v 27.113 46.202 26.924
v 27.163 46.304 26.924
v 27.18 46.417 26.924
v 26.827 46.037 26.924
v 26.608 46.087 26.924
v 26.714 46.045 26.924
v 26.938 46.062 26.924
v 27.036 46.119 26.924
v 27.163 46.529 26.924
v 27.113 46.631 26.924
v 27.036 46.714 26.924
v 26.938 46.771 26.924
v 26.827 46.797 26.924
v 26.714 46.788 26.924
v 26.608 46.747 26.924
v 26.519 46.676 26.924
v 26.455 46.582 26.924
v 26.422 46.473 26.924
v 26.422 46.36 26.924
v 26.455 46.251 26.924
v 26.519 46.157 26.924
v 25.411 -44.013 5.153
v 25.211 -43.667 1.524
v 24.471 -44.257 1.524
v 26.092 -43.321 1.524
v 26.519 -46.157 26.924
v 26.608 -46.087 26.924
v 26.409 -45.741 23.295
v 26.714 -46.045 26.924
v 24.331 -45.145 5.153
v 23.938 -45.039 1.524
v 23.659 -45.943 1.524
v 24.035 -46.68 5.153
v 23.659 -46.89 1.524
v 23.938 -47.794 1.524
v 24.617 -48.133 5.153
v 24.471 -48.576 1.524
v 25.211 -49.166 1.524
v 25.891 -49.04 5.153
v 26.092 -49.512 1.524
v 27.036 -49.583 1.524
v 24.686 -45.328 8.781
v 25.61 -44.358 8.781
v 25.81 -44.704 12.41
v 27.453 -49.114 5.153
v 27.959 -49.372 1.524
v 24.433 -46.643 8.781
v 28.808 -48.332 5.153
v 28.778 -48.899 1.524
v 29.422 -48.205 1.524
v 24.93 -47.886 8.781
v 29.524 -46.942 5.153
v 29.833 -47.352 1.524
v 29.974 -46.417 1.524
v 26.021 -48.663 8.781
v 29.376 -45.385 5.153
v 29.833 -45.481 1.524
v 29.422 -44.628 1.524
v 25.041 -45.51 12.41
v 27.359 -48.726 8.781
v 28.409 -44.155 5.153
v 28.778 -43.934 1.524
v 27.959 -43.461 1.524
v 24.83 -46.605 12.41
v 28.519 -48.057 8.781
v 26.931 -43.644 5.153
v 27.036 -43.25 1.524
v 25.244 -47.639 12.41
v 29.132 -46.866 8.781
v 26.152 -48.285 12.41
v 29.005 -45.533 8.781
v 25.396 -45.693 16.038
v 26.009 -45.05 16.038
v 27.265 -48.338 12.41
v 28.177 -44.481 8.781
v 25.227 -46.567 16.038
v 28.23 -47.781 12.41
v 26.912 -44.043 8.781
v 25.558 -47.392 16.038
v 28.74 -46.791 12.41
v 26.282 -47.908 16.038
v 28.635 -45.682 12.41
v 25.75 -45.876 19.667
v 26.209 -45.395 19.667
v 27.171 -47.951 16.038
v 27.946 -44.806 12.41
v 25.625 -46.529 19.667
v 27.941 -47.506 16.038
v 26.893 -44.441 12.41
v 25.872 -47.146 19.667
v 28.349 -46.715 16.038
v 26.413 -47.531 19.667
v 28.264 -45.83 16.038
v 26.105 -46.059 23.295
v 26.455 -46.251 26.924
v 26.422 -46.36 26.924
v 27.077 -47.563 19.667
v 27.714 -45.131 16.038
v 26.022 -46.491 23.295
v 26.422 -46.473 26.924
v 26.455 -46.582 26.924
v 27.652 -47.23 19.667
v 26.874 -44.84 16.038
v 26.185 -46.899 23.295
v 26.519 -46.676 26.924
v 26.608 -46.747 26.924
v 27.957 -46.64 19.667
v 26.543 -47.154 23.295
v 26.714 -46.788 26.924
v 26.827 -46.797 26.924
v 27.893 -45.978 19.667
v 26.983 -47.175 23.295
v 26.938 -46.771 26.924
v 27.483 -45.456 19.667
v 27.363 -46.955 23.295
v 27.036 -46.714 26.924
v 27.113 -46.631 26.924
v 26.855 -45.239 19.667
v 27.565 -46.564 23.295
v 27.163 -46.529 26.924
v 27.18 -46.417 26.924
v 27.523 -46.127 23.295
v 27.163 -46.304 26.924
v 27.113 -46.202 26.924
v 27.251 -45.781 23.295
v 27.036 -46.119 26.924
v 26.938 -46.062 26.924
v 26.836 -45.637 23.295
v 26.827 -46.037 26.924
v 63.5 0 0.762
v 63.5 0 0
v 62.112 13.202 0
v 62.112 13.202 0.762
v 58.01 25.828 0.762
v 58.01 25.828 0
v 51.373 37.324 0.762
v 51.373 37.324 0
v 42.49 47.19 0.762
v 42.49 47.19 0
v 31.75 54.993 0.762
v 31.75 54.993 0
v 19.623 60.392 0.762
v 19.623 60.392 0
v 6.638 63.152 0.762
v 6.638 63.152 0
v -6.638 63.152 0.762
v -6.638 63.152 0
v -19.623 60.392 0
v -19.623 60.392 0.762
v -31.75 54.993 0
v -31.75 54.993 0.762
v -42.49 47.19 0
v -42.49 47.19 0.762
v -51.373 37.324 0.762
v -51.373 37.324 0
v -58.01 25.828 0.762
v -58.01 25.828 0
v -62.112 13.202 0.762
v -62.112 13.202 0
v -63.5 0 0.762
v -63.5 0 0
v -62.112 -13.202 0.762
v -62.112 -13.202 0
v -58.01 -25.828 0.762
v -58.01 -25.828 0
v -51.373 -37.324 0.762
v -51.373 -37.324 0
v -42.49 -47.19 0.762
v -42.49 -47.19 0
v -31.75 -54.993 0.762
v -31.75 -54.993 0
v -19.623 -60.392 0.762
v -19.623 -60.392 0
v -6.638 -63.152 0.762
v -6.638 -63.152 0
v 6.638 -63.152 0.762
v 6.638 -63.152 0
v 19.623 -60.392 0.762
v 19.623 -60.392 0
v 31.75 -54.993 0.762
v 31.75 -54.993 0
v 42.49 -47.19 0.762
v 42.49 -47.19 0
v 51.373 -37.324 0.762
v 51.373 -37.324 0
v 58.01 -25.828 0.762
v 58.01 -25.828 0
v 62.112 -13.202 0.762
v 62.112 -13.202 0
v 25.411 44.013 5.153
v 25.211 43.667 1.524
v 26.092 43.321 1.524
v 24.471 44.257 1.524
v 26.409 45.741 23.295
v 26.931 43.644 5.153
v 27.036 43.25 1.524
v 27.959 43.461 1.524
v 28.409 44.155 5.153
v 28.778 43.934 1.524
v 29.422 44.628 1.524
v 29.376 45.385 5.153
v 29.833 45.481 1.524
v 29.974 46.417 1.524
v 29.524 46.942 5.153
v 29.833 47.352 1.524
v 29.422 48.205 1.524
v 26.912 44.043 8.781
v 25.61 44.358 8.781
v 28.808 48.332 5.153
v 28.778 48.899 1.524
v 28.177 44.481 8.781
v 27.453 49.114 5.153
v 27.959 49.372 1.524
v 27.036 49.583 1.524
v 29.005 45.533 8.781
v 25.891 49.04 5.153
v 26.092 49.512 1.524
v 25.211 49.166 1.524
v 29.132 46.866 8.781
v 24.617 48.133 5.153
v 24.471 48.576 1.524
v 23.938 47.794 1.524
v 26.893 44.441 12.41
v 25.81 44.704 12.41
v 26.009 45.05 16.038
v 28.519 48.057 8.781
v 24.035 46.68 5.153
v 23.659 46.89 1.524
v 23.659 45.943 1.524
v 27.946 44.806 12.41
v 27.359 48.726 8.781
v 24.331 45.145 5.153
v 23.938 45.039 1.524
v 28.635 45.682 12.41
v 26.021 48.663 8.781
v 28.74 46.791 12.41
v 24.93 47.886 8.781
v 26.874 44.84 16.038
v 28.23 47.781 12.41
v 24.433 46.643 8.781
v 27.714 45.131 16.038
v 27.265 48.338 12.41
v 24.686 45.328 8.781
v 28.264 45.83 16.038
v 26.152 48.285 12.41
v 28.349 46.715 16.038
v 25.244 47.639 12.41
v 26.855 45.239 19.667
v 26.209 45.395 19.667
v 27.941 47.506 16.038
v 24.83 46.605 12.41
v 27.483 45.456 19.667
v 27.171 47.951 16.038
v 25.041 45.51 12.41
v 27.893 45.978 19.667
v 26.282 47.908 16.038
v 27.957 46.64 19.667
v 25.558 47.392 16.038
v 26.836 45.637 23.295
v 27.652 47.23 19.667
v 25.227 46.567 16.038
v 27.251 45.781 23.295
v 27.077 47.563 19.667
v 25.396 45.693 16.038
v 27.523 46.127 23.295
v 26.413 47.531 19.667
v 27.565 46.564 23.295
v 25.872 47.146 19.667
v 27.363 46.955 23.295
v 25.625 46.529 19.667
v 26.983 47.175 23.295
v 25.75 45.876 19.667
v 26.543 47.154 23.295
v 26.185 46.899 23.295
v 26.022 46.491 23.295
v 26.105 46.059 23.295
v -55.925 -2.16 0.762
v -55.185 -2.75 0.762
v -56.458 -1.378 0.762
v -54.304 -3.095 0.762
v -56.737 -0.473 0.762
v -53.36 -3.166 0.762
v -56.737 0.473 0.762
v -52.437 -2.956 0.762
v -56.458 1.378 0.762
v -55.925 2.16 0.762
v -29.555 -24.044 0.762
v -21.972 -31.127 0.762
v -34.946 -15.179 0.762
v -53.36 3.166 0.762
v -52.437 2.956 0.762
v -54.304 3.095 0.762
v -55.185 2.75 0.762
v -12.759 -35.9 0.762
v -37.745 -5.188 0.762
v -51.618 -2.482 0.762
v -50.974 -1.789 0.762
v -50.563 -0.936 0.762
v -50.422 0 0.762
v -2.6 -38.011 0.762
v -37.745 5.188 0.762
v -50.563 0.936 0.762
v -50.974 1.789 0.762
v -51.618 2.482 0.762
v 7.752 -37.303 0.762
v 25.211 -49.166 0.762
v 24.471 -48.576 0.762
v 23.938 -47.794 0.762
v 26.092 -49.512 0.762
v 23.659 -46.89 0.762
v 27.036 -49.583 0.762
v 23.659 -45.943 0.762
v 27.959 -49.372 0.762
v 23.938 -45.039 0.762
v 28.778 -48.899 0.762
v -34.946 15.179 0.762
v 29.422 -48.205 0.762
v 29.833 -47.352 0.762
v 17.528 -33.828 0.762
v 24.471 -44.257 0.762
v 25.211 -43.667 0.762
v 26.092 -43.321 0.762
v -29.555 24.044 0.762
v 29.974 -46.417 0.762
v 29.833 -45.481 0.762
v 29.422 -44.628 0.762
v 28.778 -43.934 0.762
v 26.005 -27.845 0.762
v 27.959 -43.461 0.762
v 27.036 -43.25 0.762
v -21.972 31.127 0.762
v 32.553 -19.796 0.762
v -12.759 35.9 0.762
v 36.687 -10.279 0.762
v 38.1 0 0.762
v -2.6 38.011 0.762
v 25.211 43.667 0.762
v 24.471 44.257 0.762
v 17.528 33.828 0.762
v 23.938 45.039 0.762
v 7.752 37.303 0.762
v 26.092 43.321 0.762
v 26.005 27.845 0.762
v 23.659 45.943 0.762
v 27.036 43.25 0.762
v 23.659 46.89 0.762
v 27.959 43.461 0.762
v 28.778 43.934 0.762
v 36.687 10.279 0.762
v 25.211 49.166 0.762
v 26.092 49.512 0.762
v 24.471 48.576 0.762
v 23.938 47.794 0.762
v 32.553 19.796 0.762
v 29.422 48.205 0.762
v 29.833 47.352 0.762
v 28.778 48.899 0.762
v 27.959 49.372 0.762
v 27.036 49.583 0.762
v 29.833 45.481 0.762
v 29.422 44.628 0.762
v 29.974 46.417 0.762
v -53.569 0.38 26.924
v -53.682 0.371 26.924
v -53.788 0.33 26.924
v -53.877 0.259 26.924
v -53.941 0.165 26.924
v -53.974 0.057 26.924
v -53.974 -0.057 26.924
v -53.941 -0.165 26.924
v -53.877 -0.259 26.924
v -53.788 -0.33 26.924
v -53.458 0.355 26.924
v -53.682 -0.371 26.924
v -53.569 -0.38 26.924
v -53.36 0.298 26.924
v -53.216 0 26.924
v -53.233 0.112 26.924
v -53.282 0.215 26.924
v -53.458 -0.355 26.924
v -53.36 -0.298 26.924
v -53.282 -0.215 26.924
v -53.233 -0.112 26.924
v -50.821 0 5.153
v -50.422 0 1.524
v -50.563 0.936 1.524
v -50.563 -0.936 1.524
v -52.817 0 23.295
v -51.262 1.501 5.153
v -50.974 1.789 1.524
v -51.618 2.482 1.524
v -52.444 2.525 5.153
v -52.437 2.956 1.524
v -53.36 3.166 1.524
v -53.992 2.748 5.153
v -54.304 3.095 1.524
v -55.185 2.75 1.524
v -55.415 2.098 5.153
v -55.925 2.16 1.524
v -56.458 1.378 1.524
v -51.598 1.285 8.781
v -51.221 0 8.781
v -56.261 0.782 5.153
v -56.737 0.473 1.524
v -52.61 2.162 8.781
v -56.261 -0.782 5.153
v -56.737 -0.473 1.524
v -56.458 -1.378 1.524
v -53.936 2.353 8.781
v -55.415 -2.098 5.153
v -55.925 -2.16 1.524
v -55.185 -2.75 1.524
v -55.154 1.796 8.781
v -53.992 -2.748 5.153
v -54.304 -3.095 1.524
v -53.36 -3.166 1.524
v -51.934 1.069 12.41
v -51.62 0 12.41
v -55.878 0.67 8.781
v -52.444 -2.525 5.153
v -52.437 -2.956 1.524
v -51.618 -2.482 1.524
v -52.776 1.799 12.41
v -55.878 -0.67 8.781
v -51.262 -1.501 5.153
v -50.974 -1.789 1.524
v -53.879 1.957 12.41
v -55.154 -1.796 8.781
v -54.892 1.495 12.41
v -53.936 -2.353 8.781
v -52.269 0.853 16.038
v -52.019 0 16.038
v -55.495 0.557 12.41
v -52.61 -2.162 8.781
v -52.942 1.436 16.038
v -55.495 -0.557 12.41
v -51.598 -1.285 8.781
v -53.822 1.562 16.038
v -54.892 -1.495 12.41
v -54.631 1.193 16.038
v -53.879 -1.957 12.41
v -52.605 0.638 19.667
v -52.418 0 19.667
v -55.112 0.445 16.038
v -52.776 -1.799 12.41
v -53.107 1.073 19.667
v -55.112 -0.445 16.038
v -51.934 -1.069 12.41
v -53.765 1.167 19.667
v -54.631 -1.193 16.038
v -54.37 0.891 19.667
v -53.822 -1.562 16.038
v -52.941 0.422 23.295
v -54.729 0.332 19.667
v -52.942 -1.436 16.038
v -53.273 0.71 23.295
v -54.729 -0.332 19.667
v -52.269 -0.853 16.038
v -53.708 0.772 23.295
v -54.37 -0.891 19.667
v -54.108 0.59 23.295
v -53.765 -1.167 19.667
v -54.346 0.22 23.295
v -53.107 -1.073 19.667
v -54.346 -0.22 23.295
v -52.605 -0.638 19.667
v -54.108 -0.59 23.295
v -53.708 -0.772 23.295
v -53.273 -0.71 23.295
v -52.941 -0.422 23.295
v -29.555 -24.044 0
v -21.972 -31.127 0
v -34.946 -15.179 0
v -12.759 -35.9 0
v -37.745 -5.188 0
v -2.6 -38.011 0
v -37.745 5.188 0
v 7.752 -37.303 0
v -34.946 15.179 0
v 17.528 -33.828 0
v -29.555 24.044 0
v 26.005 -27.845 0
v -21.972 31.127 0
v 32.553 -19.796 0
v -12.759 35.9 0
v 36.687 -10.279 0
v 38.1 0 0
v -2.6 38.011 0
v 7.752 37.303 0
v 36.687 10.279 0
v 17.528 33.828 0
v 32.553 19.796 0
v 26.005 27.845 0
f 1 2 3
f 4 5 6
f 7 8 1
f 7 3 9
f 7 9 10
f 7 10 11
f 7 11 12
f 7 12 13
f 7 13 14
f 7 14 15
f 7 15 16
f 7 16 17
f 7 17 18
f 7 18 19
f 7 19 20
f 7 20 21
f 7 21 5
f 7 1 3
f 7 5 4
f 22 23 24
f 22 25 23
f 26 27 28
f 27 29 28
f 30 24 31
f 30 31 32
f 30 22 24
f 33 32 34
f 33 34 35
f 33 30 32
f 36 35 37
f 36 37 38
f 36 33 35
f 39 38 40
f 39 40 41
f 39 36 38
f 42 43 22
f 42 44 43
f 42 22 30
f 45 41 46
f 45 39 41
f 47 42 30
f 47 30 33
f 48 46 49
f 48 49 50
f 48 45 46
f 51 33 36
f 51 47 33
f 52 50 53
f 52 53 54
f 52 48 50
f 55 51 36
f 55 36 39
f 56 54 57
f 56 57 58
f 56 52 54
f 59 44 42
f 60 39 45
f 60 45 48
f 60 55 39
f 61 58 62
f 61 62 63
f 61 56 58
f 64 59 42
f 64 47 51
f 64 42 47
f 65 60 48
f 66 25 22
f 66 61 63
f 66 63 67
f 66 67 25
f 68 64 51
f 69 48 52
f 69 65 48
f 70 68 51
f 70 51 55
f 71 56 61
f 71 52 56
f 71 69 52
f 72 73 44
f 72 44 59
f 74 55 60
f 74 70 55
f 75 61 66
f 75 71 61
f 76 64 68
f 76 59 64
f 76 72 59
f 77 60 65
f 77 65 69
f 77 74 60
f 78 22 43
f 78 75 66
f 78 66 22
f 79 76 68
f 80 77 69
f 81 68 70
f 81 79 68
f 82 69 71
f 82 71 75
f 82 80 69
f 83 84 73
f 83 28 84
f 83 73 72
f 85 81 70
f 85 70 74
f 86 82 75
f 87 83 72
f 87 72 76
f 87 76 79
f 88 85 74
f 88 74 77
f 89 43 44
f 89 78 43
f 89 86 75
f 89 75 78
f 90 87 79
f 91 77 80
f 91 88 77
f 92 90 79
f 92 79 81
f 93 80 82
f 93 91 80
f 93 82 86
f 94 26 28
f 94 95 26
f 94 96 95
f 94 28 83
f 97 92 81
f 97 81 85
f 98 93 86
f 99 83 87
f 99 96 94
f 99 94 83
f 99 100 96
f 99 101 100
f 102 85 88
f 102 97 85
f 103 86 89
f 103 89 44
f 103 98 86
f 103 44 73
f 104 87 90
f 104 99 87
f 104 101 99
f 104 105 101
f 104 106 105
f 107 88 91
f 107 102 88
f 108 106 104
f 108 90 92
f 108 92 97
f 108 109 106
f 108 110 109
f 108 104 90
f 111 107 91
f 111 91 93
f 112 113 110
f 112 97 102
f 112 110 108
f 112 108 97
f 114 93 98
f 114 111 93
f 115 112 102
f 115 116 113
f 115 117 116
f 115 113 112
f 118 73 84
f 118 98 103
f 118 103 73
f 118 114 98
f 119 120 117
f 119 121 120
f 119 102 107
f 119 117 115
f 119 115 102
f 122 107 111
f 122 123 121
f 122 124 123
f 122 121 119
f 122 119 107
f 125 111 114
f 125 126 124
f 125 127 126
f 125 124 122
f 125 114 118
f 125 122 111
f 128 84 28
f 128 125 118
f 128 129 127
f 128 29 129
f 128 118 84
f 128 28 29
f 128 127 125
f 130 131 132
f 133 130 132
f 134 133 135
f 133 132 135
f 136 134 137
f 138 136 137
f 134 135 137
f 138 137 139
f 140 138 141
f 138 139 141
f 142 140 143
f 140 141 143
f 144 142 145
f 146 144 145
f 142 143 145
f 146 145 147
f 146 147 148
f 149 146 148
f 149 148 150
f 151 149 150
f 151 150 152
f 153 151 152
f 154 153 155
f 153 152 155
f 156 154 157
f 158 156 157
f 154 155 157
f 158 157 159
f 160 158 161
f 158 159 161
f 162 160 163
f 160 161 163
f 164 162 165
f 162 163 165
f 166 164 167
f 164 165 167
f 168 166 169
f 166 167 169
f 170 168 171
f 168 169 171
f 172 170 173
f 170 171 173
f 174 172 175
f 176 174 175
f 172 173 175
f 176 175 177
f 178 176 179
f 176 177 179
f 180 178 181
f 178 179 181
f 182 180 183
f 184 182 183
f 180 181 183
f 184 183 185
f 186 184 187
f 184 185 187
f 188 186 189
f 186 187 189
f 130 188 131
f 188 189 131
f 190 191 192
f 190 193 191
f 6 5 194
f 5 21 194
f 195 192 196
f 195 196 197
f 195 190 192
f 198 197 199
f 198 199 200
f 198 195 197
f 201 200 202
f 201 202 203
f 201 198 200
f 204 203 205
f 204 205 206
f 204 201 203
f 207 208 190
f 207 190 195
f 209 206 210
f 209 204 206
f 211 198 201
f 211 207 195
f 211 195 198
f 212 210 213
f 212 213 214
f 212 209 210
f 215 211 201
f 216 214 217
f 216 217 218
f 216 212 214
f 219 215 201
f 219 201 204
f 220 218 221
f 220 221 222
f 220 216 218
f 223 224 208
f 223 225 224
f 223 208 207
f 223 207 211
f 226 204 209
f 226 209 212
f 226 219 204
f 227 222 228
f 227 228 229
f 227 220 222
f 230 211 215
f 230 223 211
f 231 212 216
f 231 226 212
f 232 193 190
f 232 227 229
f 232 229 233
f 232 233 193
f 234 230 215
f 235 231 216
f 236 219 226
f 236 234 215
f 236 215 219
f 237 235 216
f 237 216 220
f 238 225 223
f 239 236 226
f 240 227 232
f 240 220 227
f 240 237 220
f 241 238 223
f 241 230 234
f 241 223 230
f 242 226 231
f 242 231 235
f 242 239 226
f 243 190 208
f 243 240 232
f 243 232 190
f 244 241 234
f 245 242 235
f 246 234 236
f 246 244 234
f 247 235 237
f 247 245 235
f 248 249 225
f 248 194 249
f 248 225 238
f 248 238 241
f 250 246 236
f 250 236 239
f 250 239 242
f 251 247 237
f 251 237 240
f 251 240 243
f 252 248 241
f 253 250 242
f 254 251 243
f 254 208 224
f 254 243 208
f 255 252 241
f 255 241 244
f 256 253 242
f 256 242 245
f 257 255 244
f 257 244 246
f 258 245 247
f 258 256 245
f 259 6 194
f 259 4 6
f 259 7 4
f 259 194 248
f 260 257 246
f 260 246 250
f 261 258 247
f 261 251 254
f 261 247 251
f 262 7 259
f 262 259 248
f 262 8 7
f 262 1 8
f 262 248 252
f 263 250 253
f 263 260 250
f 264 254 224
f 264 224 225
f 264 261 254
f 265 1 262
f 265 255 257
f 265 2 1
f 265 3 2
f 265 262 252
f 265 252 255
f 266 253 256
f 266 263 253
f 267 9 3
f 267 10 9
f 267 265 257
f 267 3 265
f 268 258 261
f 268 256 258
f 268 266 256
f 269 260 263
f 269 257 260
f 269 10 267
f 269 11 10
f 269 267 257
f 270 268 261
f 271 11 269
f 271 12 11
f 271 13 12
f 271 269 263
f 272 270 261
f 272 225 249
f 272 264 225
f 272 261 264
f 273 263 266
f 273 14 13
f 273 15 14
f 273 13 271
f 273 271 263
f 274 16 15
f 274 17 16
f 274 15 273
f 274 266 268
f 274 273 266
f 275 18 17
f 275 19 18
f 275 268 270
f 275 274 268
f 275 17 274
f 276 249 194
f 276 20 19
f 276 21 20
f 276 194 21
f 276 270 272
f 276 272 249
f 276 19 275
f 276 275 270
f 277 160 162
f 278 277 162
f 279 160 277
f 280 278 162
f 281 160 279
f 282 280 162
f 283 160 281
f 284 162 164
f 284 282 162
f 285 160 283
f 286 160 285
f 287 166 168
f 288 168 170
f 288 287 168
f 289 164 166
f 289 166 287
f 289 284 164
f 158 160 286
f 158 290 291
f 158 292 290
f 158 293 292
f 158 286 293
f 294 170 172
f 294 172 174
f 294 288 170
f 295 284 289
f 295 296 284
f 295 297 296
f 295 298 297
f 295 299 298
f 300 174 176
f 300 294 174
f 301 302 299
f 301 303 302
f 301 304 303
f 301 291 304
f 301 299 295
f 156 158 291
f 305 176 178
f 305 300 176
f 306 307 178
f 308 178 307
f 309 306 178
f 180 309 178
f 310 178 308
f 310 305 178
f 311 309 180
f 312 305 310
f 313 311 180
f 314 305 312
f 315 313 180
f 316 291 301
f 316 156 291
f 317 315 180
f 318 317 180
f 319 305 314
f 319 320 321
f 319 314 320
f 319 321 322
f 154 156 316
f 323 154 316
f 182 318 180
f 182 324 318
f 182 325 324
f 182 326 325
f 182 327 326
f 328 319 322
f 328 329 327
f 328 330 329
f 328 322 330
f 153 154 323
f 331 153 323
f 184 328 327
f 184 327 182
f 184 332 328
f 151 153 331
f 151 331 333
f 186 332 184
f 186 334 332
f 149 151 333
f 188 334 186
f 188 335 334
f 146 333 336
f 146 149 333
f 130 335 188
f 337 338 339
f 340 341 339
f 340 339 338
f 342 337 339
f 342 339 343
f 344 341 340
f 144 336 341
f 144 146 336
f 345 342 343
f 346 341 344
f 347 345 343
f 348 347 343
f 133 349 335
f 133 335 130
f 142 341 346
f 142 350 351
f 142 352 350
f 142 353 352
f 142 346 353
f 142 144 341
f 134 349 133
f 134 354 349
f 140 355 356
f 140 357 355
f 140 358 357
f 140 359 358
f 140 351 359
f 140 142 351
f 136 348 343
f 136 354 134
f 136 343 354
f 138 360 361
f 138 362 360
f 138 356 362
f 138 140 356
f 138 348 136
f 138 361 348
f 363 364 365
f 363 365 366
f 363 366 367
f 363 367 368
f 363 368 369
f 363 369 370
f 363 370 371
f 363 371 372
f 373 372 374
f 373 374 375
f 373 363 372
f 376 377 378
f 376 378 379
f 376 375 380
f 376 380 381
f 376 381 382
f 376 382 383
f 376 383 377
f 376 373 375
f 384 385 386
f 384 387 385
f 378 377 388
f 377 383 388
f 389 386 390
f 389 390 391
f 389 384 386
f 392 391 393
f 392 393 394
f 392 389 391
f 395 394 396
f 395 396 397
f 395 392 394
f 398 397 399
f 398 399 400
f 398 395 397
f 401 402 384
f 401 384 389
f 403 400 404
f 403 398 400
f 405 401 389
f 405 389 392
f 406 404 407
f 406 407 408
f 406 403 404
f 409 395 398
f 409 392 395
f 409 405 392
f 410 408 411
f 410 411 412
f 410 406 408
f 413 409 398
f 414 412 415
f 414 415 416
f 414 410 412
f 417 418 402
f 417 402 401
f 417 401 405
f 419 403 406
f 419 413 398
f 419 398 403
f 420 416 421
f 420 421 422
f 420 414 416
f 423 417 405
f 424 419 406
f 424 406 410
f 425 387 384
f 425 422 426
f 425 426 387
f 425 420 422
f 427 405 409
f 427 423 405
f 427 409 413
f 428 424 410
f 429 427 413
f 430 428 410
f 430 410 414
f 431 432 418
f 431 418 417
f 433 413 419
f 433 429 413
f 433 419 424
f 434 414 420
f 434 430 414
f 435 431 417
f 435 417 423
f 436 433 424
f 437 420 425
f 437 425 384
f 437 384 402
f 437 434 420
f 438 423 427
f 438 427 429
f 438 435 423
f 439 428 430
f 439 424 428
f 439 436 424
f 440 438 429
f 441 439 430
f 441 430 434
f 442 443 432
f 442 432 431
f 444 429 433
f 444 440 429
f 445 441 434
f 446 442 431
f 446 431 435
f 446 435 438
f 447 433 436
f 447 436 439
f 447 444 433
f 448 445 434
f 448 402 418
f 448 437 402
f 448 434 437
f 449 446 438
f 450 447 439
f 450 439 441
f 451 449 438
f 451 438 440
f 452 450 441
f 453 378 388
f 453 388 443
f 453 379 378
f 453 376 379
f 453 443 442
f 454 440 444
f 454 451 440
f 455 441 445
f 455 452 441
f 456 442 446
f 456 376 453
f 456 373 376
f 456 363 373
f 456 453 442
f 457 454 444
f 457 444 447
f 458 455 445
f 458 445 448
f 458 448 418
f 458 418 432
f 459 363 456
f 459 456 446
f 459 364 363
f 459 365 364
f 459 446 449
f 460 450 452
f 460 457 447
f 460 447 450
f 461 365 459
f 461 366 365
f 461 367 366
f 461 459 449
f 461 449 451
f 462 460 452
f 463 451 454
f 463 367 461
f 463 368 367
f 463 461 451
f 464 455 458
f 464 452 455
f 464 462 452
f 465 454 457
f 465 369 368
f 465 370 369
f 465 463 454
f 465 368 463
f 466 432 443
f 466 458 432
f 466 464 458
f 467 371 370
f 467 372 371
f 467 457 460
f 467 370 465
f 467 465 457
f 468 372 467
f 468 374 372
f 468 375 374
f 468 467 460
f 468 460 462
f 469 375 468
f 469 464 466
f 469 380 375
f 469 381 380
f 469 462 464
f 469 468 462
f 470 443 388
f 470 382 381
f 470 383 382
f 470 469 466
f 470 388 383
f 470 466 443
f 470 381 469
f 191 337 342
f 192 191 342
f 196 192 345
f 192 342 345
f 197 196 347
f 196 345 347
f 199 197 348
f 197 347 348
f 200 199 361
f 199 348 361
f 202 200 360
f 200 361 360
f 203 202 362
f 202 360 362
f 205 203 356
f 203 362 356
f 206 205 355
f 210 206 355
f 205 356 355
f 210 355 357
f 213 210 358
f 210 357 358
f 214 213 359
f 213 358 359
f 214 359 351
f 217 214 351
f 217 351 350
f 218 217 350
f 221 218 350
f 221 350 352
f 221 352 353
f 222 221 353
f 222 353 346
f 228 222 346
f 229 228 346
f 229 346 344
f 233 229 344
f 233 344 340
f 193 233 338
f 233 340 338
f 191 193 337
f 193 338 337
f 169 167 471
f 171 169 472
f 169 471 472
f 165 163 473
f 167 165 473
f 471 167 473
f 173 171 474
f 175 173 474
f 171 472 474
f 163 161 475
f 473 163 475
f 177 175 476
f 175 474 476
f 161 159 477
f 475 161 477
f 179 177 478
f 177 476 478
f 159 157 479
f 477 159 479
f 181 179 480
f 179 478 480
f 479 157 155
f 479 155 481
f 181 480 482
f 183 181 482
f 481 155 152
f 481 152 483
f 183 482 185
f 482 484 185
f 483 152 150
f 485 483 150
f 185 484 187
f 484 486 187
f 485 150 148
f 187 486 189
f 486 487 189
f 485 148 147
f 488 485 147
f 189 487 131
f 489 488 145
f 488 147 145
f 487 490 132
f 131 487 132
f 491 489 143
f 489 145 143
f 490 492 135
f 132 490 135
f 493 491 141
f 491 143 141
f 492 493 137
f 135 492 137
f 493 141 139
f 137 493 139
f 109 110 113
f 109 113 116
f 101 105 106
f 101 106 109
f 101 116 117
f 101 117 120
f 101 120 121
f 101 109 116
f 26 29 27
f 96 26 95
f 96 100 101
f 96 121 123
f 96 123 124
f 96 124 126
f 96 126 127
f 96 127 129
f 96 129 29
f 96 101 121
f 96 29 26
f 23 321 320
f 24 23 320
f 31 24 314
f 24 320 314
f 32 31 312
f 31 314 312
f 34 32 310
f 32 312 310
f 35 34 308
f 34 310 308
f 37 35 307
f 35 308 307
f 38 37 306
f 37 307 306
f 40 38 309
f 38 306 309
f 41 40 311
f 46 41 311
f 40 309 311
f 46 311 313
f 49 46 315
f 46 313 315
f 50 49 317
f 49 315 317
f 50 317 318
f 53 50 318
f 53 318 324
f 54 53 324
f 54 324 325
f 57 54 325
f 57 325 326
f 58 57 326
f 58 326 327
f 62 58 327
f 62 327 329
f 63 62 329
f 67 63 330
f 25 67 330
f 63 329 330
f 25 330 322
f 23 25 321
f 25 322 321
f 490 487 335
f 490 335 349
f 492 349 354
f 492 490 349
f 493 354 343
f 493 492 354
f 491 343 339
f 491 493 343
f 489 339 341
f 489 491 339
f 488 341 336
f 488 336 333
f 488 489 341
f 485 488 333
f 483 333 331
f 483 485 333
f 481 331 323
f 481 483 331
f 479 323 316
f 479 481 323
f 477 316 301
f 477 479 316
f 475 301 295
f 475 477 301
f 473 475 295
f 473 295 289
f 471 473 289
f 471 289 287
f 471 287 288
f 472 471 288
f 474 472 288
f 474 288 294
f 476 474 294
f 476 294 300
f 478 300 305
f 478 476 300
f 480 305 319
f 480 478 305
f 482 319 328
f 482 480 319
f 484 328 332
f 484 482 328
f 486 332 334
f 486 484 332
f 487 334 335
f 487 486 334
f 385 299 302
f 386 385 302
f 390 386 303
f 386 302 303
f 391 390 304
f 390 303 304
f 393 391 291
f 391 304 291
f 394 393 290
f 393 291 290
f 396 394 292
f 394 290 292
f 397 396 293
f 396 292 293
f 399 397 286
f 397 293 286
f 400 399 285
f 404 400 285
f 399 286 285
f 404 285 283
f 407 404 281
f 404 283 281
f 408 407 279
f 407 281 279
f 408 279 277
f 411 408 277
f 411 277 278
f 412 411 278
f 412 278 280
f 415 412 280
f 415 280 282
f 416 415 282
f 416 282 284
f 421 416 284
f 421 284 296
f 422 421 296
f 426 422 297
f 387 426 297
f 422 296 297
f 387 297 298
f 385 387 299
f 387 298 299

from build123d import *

# Parameters (mm, degrees)
SKETCH1_R                     = 63.5
SKETCH1_R_2                   = 38.1
BOSS_EXTRUDE1_DEPTH           = 0.762
SKETCH2_R                     = 3.175
BOSS_EXTRUDE2_DEPTH           = 26.162
CHAMFER1_SIZE                 = 25.4
CHAMFER1_SIZE2                = 2.794
CIRPATTERN3_COUNT             = 3
CHAMFER1_OF_CIRPATTERN3_SIZE2 = 2.794
CHAMFER1_OF_CIRPATTERN3_SIZE  = 25.4


with BuildPart() as part:
    # Sketch1 → Boss-Extrude1 (new body)
    with BuildSketch(Plane.XY):
        Circle(SKETCH1_R)
        Circle(SKETCH1_R_2, mode=Mode.SUBTRACT)
    extrude(amount=BOSS_EXTRUDE1_DEPTH)

    # Sketch2 → Boss-Extrude2 (add)
    with BuildSketch(Plane.XY.offset(0.762)):
        with Locations((-53.597287335, 0)):
            Circle(SKETCH2_R)
    boss_extrude2 = extrude(amount=BOSS_EXTRUDE2_DEPTH)

    # Chamfer1
    chamfer1_edges = [part.edges().sort_by_distance(p)[0] for p in [
        (-56.772287335, 0, 26.924),
    ]]
    chamfer1_side = [part.faces().sort_by_distance(p)[0] for p in [
        (-56.772287335, 0, 13.843),
    ]]
    chamfer(chamfer1_edges, length=CHAMFER1_SIZE, length2=CHAMFER1_SIZE2, reference=chamfer1_side[0])

    # CirPattern3: Boss-Extrude2 ×3 about axis
    cirpattern3_axis = Axis((0, 0, 0), (0, 0, 1))
    for i in range(1, CIRPATTERN3_COUNT):
        add(boss_extrude2.rotate(cirpattern3_axis, i * 360 / CIRPATTERN3_COUNT))

    # Chamfer1 of CirPattern3
    chamfer1_of_cirpattern3_edges = [part.edges().sort_by_distance(p)[0] for p in [
        (28.386143667, -49.166243063, 26.924),
        (28.386143667, 49.166243063, 26.924),
    ]]
    chamfer(chamfer1_of_cirpattern3_edges, length=CHAMFER1_OF_CIRPATTERN3_SIZE, length2=CHAMFER1_OF_CIRPATTERN3_SIZE2)


solid = part.part
